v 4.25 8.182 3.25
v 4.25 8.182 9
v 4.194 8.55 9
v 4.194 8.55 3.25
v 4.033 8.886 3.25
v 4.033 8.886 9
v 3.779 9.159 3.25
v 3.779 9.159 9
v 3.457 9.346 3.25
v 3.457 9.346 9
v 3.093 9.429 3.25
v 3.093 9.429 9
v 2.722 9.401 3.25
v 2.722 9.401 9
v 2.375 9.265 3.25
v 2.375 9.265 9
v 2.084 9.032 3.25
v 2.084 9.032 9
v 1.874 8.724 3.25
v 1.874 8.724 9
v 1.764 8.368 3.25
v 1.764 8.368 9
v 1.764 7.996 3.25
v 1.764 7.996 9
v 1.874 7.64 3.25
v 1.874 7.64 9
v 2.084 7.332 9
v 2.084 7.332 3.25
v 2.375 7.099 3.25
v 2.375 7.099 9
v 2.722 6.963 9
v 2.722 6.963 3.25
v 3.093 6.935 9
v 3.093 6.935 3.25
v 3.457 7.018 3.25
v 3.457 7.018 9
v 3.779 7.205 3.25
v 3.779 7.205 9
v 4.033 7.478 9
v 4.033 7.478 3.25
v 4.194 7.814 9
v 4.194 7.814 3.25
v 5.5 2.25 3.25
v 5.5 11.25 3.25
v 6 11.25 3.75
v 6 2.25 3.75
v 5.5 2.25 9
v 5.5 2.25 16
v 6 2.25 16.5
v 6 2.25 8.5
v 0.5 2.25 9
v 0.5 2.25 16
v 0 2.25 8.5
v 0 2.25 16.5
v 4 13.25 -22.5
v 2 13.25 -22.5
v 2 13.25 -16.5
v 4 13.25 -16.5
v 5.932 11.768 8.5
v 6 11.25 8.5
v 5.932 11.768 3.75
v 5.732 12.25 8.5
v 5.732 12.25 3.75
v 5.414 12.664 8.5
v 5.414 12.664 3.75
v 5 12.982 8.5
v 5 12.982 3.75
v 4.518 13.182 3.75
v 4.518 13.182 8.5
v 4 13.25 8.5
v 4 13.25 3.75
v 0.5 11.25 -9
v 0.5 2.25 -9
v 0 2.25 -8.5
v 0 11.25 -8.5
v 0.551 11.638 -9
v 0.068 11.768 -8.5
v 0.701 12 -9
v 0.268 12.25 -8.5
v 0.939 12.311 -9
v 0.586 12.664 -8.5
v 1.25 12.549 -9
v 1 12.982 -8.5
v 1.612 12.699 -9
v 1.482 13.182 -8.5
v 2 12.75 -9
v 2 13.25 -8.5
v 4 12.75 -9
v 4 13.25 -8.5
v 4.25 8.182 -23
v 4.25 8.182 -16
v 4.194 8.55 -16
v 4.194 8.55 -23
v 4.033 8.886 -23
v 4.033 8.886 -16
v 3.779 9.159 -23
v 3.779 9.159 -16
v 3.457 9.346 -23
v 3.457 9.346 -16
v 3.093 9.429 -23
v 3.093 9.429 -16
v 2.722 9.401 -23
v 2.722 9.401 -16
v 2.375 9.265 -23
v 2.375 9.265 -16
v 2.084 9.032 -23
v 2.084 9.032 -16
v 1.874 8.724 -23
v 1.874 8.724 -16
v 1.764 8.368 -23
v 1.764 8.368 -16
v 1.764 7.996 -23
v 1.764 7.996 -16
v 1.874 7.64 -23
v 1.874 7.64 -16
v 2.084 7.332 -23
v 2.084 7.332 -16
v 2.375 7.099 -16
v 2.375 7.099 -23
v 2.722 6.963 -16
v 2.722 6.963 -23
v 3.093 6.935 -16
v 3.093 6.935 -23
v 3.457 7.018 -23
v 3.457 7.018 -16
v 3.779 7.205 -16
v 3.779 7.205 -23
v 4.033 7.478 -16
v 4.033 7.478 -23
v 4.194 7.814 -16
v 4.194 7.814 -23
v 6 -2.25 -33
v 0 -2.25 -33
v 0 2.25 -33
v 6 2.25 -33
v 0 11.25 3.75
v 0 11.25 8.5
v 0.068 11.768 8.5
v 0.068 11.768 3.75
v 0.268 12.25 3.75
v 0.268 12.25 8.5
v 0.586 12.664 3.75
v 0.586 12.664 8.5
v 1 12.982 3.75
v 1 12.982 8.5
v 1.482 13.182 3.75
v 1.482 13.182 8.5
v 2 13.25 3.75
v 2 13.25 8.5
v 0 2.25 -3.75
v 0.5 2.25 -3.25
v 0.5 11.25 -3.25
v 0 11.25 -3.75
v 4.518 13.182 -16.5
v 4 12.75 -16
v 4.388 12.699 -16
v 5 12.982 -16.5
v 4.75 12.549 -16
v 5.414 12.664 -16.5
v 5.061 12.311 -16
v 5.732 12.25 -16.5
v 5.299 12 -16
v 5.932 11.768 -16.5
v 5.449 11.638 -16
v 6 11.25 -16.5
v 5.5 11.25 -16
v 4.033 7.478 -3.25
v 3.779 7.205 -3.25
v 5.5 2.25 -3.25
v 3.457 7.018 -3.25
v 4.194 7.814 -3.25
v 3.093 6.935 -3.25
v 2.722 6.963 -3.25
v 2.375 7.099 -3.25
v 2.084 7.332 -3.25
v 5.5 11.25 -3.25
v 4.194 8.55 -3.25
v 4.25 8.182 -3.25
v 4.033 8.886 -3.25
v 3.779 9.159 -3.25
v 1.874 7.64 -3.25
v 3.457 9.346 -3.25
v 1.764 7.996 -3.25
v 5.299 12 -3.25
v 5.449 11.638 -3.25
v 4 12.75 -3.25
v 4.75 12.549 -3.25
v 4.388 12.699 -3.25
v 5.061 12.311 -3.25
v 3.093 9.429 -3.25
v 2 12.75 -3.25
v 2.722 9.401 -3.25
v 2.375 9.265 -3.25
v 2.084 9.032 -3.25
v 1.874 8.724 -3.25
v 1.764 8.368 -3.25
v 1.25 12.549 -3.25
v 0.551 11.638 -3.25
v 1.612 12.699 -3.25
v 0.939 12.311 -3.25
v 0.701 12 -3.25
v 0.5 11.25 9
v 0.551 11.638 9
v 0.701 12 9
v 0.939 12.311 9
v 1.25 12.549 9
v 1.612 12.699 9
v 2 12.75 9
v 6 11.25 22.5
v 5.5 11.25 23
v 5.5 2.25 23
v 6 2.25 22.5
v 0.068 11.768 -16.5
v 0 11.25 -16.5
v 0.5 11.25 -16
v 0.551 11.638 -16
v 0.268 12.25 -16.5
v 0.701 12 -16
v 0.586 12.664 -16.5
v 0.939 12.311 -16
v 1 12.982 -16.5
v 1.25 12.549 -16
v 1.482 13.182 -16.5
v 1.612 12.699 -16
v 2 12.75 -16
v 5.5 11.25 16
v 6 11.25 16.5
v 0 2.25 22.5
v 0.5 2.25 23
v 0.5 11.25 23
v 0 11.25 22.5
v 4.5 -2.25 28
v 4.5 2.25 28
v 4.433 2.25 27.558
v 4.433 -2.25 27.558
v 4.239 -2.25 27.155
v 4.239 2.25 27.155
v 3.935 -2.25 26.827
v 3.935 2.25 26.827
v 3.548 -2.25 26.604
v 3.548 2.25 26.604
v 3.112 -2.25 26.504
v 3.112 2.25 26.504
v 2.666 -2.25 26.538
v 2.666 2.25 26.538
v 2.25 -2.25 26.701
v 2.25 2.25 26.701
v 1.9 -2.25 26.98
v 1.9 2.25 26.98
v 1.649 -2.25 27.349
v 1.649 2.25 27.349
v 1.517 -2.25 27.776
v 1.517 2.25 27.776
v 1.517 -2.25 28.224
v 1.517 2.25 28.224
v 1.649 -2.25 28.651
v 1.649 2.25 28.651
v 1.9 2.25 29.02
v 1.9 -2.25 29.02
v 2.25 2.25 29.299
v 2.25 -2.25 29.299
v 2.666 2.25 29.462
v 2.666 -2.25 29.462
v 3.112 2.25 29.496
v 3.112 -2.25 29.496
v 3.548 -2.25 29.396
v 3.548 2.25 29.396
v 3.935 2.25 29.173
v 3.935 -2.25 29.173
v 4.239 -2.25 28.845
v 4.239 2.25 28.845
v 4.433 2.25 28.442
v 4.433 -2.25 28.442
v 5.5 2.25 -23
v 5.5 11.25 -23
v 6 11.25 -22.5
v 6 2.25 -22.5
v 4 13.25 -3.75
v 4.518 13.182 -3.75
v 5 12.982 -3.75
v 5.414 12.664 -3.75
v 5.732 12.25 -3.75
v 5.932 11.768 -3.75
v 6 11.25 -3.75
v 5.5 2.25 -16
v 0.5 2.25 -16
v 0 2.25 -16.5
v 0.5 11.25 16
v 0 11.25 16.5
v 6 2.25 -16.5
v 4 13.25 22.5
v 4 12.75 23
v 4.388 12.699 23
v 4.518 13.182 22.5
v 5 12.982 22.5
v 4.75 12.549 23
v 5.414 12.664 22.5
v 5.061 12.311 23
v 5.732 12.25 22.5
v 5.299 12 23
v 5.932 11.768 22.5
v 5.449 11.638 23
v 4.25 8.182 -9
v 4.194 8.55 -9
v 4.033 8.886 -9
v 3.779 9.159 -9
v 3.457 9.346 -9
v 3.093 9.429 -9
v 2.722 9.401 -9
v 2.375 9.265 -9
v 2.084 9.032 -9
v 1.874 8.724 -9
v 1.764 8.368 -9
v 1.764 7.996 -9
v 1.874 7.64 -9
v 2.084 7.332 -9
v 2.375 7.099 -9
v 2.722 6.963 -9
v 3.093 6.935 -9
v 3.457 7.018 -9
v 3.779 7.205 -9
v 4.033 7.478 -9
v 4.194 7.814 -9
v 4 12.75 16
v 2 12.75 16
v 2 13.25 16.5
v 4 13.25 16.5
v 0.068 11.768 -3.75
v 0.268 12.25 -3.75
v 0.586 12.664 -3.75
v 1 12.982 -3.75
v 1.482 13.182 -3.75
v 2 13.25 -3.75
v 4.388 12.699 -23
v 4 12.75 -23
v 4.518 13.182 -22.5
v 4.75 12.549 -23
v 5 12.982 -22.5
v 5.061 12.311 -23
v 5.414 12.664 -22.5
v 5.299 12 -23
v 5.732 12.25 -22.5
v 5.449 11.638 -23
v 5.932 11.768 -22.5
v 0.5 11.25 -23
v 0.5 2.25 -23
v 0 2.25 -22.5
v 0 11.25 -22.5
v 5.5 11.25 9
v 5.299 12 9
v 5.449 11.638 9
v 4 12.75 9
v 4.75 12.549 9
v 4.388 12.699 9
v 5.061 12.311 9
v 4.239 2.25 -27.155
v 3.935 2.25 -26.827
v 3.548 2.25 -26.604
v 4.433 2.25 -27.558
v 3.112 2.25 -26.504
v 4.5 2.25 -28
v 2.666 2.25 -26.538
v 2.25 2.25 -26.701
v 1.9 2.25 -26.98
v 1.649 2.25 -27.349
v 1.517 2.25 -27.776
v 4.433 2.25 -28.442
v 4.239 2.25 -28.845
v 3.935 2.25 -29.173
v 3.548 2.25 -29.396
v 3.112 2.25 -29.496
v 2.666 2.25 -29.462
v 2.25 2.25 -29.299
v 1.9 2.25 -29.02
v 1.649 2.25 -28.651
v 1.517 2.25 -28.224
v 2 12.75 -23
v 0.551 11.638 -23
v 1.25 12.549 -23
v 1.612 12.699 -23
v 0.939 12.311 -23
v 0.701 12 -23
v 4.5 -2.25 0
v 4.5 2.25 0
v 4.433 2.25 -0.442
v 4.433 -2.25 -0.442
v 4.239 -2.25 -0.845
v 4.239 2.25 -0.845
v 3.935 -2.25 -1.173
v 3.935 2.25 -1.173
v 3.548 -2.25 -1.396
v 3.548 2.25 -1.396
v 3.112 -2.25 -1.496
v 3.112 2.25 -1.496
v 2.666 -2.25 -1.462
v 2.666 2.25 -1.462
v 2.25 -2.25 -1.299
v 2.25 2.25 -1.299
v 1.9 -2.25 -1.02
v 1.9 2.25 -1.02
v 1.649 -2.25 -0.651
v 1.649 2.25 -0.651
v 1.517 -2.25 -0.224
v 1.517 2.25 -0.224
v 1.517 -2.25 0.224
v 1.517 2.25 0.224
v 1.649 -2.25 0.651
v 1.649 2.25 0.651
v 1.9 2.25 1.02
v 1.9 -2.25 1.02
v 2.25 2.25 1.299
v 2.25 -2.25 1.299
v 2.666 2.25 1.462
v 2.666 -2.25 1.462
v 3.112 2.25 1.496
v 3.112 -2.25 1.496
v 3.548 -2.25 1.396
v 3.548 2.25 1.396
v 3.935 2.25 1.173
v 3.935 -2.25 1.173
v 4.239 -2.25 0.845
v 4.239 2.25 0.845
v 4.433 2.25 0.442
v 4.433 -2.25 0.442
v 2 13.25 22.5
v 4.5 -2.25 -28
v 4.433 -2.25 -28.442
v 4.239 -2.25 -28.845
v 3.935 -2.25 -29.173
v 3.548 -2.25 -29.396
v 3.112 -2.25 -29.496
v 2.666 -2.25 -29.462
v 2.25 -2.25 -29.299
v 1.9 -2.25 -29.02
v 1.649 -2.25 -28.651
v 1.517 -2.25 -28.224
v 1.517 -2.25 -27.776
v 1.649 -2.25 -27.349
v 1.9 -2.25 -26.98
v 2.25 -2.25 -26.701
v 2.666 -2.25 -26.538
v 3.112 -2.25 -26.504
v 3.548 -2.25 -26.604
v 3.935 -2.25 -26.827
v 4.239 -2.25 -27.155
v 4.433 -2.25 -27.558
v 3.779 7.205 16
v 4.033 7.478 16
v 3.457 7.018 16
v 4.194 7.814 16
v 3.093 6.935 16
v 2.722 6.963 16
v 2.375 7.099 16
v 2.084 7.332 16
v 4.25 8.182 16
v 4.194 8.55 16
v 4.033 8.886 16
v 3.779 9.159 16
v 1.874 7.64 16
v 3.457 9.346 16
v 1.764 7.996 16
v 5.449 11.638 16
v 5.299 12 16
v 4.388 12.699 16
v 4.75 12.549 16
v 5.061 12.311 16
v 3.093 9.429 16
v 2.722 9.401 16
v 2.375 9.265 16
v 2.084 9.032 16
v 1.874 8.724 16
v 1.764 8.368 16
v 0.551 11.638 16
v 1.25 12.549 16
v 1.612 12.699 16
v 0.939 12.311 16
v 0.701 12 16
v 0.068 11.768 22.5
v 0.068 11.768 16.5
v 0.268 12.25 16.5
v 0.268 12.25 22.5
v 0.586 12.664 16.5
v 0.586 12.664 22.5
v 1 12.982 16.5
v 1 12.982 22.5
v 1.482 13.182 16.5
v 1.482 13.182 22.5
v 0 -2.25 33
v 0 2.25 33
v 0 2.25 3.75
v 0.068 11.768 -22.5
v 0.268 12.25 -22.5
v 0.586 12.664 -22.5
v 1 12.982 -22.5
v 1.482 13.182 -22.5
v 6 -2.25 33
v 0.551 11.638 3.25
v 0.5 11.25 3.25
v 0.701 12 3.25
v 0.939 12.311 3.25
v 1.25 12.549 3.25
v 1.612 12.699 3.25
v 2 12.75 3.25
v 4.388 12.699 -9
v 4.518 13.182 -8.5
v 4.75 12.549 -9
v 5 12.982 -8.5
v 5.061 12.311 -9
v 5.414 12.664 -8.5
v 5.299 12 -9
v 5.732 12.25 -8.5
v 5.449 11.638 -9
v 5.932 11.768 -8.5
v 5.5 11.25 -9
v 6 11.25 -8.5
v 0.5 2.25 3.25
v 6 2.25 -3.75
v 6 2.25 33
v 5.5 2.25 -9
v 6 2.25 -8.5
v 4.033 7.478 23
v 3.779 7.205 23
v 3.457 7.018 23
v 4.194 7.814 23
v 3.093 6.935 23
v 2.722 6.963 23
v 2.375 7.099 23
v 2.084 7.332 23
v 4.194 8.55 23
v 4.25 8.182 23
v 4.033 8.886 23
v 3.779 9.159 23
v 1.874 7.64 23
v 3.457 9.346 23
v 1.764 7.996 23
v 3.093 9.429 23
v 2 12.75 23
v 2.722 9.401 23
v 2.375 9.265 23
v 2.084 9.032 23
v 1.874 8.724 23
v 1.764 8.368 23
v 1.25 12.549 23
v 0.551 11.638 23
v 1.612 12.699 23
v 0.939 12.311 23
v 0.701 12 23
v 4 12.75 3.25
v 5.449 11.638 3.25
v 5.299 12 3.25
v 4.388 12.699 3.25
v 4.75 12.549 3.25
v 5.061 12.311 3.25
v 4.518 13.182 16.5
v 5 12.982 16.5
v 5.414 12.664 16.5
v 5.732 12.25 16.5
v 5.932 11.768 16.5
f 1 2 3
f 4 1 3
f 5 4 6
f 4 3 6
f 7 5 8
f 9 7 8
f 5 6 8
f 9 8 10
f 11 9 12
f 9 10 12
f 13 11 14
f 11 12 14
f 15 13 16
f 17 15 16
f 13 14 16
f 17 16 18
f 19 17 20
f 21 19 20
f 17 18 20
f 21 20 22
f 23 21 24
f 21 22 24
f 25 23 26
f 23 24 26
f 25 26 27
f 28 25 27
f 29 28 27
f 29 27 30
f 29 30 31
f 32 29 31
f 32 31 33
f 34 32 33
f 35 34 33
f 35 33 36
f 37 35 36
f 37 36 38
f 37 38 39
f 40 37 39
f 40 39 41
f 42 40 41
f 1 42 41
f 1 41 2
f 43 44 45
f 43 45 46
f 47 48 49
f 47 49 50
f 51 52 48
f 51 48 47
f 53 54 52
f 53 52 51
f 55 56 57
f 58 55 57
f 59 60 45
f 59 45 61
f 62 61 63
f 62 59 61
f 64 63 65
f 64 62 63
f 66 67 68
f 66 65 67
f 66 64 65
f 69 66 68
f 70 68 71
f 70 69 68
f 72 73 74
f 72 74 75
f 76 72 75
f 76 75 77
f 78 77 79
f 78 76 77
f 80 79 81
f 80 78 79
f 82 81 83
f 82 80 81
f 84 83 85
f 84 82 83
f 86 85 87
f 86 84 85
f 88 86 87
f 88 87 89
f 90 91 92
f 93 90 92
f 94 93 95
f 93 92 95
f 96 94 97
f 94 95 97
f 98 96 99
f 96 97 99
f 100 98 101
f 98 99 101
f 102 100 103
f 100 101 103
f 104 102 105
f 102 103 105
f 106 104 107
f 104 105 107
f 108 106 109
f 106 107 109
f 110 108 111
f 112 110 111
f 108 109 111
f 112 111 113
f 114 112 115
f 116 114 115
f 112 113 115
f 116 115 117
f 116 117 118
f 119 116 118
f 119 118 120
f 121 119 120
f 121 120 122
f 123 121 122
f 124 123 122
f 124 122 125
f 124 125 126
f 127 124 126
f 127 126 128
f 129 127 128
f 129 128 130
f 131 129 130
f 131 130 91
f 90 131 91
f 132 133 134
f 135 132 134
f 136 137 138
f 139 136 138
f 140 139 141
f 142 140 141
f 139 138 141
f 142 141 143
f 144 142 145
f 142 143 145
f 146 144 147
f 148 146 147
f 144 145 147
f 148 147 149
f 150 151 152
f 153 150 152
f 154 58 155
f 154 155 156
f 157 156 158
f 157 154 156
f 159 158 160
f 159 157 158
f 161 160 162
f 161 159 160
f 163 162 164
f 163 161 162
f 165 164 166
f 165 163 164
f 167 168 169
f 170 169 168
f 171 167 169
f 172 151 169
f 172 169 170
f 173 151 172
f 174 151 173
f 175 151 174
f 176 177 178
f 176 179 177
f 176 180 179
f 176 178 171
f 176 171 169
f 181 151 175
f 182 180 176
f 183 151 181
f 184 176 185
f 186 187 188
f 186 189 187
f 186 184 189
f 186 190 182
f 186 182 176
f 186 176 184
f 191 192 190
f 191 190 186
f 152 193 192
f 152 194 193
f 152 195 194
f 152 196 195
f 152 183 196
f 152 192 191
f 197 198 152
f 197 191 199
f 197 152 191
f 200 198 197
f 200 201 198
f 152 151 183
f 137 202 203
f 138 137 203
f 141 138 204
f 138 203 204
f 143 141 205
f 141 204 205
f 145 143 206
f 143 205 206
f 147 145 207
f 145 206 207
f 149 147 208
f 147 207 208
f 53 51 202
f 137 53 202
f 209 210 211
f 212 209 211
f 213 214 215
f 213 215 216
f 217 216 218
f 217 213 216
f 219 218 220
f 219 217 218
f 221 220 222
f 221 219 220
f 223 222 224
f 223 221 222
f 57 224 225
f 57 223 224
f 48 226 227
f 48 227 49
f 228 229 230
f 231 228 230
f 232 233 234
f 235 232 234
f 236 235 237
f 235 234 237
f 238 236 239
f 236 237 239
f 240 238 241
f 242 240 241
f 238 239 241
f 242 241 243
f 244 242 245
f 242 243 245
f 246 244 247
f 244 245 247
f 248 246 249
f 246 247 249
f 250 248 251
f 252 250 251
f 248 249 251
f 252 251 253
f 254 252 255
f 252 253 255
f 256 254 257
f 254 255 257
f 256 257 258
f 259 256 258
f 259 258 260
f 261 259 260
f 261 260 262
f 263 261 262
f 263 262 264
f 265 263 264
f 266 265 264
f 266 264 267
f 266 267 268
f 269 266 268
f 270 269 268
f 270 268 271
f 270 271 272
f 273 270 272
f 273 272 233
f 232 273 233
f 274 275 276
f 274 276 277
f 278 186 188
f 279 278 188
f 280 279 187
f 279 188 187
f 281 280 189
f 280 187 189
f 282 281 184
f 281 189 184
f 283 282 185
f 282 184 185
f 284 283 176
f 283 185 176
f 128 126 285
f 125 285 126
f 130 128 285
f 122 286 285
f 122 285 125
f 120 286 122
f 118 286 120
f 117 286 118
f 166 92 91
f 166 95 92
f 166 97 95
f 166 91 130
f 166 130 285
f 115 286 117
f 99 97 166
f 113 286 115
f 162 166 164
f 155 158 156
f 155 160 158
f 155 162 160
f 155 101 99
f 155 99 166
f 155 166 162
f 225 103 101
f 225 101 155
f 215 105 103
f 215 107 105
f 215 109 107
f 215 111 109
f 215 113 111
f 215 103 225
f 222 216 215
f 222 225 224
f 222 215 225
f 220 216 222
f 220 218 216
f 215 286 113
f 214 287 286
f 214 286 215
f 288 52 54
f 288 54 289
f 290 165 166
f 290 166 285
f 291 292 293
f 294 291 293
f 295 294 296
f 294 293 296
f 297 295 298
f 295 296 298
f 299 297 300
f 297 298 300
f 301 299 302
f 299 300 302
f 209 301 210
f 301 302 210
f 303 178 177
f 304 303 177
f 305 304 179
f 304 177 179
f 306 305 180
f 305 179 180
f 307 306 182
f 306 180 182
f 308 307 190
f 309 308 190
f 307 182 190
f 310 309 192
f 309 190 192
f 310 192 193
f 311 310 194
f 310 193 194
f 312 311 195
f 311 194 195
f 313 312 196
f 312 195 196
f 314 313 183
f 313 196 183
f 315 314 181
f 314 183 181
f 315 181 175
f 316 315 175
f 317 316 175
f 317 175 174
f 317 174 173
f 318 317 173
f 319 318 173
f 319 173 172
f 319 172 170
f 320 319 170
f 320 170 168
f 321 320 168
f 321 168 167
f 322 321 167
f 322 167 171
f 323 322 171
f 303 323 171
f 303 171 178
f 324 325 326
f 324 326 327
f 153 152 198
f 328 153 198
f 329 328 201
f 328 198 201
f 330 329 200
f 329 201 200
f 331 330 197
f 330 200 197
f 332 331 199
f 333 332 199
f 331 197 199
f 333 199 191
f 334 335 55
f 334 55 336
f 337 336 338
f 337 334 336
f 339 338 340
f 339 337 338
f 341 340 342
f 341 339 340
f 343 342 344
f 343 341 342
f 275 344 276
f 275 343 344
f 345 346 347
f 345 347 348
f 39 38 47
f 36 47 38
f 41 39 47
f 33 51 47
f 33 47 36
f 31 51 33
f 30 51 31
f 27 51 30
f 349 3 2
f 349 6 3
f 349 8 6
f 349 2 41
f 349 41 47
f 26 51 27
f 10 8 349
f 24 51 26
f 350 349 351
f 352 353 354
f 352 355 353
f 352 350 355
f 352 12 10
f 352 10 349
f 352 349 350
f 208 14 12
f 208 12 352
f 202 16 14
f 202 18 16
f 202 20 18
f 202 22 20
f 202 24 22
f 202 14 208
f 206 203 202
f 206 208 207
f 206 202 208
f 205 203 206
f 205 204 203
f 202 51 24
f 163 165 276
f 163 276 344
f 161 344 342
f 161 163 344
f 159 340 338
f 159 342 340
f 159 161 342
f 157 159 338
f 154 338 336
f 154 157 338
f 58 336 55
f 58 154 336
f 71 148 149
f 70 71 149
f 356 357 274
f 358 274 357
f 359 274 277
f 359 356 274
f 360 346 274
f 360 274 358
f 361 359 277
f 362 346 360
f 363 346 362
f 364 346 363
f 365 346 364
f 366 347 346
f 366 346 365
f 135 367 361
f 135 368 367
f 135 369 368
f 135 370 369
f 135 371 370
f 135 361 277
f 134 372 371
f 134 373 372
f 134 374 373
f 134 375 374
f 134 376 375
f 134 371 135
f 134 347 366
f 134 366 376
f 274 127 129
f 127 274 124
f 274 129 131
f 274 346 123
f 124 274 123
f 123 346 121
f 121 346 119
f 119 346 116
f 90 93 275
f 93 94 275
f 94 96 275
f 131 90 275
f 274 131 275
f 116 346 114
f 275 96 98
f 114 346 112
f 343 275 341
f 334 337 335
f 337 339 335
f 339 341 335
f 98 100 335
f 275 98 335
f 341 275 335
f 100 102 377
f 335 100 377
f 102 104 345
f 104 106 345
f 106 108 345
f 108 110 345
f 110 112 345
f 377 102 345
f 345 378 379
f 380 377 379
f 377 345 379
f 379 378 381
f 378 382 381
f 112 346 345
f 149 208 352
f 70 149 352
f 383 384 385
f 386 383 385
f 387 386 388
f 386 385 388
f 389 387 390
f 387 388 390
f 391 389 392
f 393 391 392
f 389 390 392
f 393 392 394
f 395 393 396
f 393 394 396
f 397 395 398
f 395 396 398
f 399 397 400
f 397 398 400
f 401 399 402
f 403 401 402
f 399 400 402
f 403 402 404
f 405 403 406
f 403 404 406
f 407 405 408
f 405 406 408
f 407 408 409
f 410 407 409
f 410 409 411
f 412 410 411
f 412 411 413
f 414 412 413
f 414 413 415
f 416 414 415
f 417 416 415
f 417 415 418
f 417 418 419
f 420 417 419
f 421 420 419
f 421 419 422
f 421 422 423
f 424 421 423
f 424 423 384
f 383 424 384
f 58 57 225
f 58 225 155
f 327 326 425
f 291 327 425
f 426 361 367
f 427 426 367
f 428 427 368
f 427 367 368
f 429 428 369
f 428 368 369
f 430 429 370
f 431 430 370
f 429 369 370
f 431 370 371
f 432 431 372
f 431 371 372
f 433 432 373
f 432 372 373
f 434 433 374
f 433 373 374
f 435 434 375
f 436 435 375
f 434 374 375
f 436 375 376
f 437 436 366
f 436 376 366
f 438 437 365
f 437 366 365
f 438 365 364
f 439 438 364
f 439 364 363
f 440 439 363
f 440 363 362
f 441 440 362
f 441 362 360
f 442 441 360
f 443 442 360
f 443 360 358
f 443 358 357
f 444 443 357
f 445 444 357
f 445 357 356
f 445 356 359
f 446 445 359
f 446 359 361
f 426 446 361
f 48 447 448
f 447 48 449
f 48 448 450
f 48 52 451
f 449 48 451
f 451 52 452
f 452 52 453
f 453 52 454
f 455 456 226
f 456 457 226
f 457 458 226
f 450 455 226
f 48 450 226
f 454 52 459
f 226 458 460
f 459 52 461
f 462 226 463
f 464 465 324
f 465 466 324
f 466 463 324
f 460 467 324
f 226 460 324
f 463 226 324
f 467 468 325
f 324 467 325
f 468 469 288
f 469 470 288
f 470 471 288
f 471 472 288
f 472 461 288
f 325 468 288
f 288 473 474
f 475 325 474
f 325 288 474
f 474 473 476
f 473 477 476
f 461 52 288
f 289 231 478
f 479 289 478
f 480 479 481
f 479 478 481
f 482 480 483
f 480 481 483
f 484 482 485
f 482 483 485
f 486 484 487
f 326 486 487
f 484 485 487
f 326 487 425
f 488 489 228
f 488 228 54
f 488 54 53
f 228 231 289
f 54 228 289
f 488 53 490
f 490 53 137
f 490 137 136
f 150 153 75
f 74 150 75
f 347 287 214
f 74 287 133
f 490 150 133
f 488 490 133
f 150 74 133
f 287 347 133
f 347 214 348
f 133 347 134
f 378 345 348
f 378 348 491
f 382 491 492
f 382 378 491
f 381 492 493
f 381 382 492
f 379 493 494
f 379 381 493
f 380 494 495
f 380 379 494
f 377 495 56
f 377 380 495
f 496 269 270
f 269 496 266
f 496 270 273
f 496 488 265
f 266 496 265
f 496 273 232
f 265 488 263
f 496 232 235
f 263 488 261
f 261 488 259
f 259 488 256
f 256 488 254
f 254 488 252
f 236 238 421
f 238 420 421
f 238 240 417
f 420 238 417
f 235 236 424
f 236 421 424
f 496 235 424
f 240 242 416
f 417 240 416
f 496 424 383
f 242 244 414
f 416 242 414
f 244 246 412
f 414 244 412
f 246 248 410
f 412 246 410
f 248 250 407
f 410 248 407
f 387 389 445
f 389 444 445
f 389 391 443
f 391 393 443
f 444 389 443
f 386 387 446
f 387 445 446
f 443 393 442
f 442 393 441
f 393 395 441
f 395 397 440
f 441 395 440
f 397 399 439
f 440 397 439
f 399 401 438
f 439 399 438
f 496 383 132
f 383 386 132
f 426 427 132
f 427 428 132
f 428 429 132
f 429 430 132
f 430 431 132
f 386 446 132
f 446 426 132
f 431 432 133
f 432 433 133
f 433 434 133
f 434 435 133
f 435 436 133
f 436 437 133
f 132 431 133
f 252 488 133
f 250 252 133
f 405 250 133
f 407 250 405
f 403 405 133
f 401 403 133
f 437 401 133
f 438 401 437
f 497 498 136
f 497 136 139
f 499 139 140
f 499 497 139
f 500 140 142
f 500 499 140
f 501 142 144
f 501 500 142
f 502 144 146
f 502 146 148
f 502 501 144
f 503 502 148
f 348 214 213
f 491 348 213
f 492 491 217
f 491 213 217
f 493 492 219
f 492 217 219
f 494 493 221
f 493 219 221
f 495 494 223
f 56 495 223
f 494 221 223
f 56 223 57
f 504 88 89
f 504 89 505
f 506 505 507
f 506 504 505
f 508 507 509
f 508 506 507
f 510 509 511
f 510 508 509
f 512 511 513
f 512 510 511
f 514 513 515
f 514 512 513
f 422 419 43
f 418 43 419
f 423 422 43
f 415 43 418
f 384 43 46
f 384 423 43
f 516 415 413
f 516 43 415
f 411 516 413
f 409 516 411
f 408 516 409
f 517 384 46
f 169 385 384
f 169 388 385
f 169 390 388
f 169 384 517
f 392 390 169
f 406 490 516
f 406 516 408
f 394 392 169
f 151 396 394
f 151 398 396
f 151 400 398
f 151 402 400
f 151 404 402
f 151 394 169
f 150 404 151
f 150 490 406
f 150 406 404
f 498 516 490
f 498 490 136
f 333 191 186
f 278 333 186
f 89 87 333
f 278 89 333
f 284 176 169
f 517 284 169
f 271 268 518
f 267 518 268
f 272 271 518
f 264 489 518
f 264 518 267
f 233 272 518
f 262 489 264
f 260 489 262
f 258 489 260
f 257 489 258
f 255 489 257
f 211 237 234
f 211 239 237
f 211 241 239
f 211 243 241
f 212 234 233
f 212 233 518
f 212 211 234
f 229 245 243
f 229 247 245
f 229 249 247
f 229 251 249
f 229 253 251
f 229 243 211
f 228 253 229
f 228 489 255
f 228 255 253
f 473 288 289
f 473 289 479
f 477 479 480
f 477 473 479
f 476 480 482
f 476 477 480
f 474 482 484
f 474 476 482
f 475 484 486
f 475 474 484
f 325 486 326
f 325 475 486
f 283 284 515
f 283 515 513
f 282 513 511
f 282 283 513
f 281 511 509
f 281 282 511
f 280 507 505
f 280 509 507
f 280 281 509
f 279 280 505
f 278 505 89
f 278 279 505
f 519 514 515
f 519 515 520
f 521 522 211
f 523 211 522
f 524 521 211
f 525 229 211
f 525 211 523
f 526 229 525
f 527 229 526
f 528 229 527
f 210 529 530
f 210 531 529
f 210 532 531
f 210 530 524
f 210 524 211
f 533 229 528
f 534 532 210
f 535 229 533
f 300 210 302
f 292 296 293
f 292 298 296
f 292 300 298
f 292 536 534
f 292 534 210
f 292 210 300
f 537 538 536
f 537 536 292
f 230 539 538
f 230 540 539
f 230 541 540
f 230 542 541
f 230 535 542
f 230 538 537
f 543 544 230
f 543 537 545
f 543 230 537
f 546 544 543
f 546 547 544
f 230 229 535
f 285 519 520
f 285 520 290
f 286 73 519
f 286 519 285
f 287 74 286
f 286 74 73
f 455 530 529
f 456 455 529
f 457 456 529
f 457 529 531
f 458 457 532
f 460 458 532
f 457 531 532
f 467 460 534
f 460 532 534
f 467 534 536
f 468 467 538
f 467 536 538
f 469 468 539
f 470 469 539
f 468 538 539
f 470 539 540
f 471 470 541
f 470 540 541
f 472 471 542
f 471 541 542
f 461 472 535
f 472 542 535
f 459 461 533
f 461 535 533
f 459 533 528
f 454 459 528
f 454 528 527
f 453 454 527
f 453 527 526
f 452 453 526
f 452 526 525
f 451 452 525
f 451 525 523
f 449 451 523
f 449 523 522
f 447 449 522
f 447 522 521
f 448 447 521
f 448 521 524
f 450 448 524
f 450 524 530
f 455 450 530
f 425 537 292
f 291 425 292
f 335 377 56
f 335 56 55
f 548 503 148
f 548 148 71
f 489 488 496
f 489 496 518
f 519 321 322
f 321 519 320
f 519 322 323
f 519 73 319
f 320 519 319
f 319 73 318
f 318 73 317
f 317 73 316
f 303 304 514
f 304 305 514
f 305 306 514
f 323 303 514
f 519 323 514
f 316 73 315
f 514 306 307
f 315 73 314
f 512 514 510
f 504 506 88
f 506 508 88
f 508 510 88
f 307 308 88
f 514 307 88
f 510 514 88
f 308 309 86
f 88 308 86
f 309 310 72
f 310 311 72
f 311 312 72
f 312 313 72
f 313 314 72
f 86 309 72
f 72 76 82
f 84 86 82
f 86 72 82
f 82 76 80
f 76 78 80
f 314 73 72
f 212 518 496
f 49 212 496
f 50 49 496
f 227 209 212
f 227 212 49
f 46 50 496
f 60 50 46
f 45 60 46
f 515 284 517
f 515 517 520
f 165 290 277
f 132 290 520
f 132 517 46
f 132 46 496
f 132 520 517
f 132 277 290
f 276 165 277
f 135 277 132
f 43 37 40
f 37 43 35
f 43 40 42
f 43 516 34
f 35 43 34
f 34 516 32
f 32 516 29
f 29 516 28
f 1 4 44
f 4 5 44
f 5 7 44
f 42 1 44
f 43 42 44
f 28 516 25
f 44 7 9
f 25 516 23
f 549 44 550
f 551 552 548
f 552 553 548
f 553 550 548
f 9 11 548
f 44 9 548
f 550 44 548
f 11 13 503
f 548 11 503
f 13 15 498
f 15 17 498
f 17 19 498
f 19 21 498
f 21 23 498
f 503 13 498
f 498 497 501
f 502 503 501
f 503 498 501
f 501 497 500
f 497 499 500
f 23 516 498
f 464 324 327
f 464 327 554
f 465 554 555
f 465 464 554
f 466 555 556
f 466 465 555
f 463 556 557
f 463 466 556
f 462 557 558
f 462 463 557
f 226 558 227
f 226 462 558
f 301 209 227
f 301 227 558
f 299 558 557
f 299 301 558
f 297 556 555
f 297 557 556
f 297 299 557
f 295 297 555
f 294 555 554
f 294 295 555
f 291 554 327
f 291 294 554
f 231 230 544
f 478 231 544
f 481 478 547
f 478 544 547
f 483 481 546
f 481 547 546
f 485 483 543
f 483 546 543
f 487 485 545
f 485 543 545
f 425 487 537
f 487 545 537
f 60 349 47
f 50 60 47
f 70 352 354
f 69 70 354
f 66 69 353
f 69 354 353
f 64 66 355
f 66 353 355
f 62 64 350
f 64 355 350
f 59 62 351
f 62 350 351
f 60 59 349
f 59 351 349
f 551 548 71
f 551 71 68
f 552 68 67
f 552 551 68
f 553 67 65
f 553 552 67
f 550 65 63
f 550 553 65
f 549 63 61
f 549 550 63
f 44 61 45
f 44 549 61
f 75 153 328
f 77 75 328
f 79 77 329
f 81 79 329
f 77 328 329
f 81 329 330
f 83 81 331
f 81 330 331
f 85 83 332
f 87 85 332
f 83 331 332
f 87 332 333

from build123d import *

# Parameters (mm, degrees)
SKETCH_1_W          = 66
SKETCH_1_H          = 4.5
EXTRUDE_1_DEPTH     = 6
SKETCH_2_W          = 5.75
SKETCH_2_H          = 11
SKETCH_2_W_2        = 7
EXTRUDE_2_DEPTH     = 6
SKETCH_3_R          = 1.25
CUT_EXTRUDE_1_DEPTH = 51
SKETCH_4_R          = 1.5
CUT_EXTRUDE_2_DEPTH = 51
FILLET_1_R          = 2
FILLET_2_R          = 2
FILLET_3_R          = 2
FILLET_4_R          = 2
FILLET_5_R          = 2
FILLET_6_R          = 2
FILLET_7_R          = 2
FILLET_8_R          = 2
CHAMFER_1_SIZE      = 0.5
CHAMFER_2_SIZE      = 0.5


with BuildPart() as part:
    # 草图1 → 凸台-拉伸1 (new body)
    with BuildSketch(Plane(origin=(0, 0, 0), x_dir=(0, 0, -1), z_dir=(1, 0, 0))):
        Rectangle(SKETCH_1_W, SKETCH_1_H)
    extrude(amount=EXTRUDE_1_DEPTH)

    # 草图2 → 凸台-拉伸2 (add)
    with BuildSketch(Plane.ZY):
        with Locations((6.125, 7.75)):
            Rectangle(SKETCH_2_W, SKETCH_2_H)
        with Locations((19.5, 7.75)):
            Rectangle(SKETCH_2_W_2, SKETCH_2_H)
        with Locations((-19.5, 7.75)):
            Rectangle(SKETCH_2_W_2, SKETCH_2_H)
        with Locations((-6.125, 7.75)):
            Rectangle(SKETCH_2_W, SKETCH_2_H)
    extrude(amount=-EXTRUDE_2_DEPTH)

    # 草图3 → 切除-拉伸1 (cut)
    with BuildSketch(Plane.XY.offset(23)):
        with Locations((3, 8.182)):
            Circle(SKETCH_3_R)
    extrude(amount=-CUT_EXTRUDE_1_DEPTH, mode=Mode.SUBTRACT)

    # 草图4 → 切除-拉伸2 (cut)
    with BuildSketch(Plane(origin=(0, 2.25, 0), x_dir=(1, 0, 0), z_dir=(0, 1, 0))):
        with Locations((3, 0)):
            Circle(SKETCH_4_R)
        with Locations((3, 28)):
            Circle(SKETCH_4_R)
        with Locations((3, -28)):
            Circle(SKETCH_4_R)
    extrude(amount=-CUT_EXTRUDE_2_DEPTH, mode=Mode.SUBTRACT)

    # 圆角1
    fillet_1_edges = [part.edges().sort_by_distance(p)[0] for p in [
        (6, 13.25, 19.5),
    ]]
    fillet(fillet_1_edges, radius=FILLET_1_R)

    # 圆角2
    fillet_2_edges = [part.edges().sort_by_distance(p)[0] for p in [
        (6, 13.25, -19.5),
    ]]
    fillet(fillet_2_edges, radius=FILLET_2_R)

    # 圆角3
    fillet_3_edges = [part.edges().sort_by_distance(p)[0] for p in [
        (6, 13.25, 6.125),
    ]]
    fillet(fillet_3_edges, radius=FILLET_3_R)

    # 圆角4
    fillet_4_edges = [part.edges().sort_by_distance(p)[0] for p in [
        (6, 13.25, -6.125),
    ]]
    fillet(fillet_4_edges, radius=FILLET_4_R)

    # 圆角5
    fillet_5_edges = [part.edges().sort_by_distance(p)[0] for p in [
        (0, 13.25, -19.5),
    ]]
    fillet(fillet_5_edges, radius=FILLET_5_R)

    # 圆角6
    fillet_6_edges = [part.edges().sort_by_distance(p)[0] for p in [
        (0, 13.25, -6.125),
    ]]
    fillet(fillet_6_edges, radius=FILLET_6_R)

    # 圆角7
    fillet_7_edges = [part.edges().sort_by_distance(p)[0] for p in [
        (0, 13.25, 6.125),
    ]]
    fillet(fillet_7_edges, radius=FILLET_7_R)

    # 圆角8
    fillet_8_edges = [part.edges().sort_by_distance(p)[0] for p in [
        (0, 13.25, 19.5),
    ]]
    fillet(fillet_8_edges, radius=FILLET_8_R)

    # 倒角1
    chamfer_1_edges = [part.edges().sort_by_distance(p)[0] for p in [
        (3, 13.25, -16),
        (5.414213562, 12.664213562, -16),
        (0.585786438, 12.664213562, -16),
        (6, 6.75, -16),
        (0, 6.75, -16),
    ]]
    chamfer(chamfer_1_edges, length=CHAMFER_1_SIZE)

    # 倒角2
    chamfer_2_edges = [part.edges().sort_by_distance(p)[0] for p in [
        (0, 6.75, -23),
        (6, 6.75, -23),
        (0.585786438, 12.664213562, -23),
        (5.414213562, 12.664213562, -23),
        (3, 13.25, -23),
        (0, 6.75, -9),
        (6, 6.75, -9),
        (0.585786438, 12.664213562, -9),
        (5.414213562, 12.664213562, -9),
        (3, 13.25, -9),
        (0, 6.75, 3.25),
        (6, 6.75, 3.25),
        (0.585786438, 12.664213562, 3.25),
        (5.414213562, 12.664213562, 3.25),
        (3, 13.25, 3.25),
        (0, 6.75, 16),
        (6, 6.75, 16),
        (0.585786438, 12.664213562, 16),
        (5.414213562, 12.664213562, 16),
        (3, 13.25, 16),
        (0, 6.75, 23),
        (6, 6.75, 23),
        (0.585786438, 12.664213562, 23),
        (5.414213562, 12.664213562, 23),
        (3, 13.25, 23),
        (0, 6.75, 9),
        (6, 6.75, 9),
        (0.585786438, 12.664213562, 9),
        (5.414213562, 12.664213562, 9),
        (3, 13.25, 9),
        (0, 6.75, -3.25),
        (6, 6.75, -3.25),
        (0.585786438, 12.664213562, -3.25),
        (5.414213562, 12.664213562, -3.25),
        (3, 13.25, -3.25),
    ]]
    chamfer(chamfer_2_edges, length=CHAMFER_2_SIZE)


solid = part.part
